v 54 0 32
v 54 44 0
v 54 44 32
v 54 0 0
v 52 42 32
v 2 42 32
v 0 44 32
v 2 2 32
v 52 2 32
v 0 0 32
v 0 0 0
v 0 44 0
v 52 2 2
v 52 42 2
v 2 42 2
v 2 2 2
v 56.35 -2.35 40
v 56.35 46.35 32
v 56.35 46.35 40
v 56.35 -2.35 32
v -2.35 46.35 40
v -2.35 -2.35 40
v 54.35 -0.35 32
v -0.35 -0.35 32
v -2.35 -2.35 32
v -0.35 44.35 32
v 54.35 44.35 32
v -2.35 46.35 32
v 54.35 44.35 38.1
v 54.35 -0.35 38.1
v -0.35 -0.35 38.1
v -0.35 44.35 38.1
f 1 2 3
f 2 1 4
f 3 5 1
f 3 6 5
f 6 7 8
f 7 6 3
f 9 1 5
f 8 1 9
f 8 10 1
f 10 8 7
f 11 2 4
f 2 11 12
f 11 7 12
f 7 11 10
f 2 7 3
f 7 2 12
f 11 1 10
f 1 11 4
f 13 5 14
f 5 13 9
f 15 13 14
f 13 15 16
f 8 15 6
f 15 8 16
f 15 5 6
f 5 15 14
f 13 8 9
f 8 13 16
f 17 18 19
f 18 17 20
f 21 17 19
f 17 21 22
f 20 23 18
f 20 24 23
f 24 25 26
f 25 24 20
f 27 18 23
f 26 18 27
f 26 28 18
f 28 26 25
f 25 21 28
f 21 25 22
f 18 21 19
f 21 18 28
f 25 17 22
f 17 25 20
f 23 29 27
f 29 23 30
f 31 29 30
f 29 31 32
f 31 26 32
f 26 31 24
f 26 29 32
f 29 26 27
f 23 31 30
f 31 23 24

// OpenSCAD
// 3D-printable two-part enclosure, units: mm
$fn = 48;

internal_x = 50;
internal_y = 40;
internal_z = 30;

wall = 2.0;
clearance = 0.35;

base_inner_h = internal_z;
base_outer_x = internal_x + 2 * wall;
base_outer_y = internal_y + 2 * wall;
base_outer_h = internal_z + wall;

lid_top_th = wall;
lid_skirt_h = 6;
lid_outer_x = base_outer_x + 2 * (wall + clearance);
lid_outer_y = base_outer_y + 2 * (wall + clearance);
lid_inner_x = base_outer_x + 2 * clearance;
lid_inner_y = base_outer_y + 2 * clearance;

module base() {
    difference() {
        cube([base_outer_x, base_outer_y, base_outer_h], center = false);

        translate([wall, wall, wall])
            cube([internal_x, internal_y, base_inner_h + 0.2], center = false);
    }
}

module lid() {
    difference() {
        cube([lid_outer_x, lid_outer_y, lid_top_th + lid_skirt_h], center = false);

        translate([wall, wall, -0.1])
            cube([lid_inner_x, lid_inner_y, lid_skirt_h + 0.2], center = false);
    }
}

base();

translate([
    -(wall + clearance),
    -(wall + clearance),
    base_outer_h
])
    lid();
